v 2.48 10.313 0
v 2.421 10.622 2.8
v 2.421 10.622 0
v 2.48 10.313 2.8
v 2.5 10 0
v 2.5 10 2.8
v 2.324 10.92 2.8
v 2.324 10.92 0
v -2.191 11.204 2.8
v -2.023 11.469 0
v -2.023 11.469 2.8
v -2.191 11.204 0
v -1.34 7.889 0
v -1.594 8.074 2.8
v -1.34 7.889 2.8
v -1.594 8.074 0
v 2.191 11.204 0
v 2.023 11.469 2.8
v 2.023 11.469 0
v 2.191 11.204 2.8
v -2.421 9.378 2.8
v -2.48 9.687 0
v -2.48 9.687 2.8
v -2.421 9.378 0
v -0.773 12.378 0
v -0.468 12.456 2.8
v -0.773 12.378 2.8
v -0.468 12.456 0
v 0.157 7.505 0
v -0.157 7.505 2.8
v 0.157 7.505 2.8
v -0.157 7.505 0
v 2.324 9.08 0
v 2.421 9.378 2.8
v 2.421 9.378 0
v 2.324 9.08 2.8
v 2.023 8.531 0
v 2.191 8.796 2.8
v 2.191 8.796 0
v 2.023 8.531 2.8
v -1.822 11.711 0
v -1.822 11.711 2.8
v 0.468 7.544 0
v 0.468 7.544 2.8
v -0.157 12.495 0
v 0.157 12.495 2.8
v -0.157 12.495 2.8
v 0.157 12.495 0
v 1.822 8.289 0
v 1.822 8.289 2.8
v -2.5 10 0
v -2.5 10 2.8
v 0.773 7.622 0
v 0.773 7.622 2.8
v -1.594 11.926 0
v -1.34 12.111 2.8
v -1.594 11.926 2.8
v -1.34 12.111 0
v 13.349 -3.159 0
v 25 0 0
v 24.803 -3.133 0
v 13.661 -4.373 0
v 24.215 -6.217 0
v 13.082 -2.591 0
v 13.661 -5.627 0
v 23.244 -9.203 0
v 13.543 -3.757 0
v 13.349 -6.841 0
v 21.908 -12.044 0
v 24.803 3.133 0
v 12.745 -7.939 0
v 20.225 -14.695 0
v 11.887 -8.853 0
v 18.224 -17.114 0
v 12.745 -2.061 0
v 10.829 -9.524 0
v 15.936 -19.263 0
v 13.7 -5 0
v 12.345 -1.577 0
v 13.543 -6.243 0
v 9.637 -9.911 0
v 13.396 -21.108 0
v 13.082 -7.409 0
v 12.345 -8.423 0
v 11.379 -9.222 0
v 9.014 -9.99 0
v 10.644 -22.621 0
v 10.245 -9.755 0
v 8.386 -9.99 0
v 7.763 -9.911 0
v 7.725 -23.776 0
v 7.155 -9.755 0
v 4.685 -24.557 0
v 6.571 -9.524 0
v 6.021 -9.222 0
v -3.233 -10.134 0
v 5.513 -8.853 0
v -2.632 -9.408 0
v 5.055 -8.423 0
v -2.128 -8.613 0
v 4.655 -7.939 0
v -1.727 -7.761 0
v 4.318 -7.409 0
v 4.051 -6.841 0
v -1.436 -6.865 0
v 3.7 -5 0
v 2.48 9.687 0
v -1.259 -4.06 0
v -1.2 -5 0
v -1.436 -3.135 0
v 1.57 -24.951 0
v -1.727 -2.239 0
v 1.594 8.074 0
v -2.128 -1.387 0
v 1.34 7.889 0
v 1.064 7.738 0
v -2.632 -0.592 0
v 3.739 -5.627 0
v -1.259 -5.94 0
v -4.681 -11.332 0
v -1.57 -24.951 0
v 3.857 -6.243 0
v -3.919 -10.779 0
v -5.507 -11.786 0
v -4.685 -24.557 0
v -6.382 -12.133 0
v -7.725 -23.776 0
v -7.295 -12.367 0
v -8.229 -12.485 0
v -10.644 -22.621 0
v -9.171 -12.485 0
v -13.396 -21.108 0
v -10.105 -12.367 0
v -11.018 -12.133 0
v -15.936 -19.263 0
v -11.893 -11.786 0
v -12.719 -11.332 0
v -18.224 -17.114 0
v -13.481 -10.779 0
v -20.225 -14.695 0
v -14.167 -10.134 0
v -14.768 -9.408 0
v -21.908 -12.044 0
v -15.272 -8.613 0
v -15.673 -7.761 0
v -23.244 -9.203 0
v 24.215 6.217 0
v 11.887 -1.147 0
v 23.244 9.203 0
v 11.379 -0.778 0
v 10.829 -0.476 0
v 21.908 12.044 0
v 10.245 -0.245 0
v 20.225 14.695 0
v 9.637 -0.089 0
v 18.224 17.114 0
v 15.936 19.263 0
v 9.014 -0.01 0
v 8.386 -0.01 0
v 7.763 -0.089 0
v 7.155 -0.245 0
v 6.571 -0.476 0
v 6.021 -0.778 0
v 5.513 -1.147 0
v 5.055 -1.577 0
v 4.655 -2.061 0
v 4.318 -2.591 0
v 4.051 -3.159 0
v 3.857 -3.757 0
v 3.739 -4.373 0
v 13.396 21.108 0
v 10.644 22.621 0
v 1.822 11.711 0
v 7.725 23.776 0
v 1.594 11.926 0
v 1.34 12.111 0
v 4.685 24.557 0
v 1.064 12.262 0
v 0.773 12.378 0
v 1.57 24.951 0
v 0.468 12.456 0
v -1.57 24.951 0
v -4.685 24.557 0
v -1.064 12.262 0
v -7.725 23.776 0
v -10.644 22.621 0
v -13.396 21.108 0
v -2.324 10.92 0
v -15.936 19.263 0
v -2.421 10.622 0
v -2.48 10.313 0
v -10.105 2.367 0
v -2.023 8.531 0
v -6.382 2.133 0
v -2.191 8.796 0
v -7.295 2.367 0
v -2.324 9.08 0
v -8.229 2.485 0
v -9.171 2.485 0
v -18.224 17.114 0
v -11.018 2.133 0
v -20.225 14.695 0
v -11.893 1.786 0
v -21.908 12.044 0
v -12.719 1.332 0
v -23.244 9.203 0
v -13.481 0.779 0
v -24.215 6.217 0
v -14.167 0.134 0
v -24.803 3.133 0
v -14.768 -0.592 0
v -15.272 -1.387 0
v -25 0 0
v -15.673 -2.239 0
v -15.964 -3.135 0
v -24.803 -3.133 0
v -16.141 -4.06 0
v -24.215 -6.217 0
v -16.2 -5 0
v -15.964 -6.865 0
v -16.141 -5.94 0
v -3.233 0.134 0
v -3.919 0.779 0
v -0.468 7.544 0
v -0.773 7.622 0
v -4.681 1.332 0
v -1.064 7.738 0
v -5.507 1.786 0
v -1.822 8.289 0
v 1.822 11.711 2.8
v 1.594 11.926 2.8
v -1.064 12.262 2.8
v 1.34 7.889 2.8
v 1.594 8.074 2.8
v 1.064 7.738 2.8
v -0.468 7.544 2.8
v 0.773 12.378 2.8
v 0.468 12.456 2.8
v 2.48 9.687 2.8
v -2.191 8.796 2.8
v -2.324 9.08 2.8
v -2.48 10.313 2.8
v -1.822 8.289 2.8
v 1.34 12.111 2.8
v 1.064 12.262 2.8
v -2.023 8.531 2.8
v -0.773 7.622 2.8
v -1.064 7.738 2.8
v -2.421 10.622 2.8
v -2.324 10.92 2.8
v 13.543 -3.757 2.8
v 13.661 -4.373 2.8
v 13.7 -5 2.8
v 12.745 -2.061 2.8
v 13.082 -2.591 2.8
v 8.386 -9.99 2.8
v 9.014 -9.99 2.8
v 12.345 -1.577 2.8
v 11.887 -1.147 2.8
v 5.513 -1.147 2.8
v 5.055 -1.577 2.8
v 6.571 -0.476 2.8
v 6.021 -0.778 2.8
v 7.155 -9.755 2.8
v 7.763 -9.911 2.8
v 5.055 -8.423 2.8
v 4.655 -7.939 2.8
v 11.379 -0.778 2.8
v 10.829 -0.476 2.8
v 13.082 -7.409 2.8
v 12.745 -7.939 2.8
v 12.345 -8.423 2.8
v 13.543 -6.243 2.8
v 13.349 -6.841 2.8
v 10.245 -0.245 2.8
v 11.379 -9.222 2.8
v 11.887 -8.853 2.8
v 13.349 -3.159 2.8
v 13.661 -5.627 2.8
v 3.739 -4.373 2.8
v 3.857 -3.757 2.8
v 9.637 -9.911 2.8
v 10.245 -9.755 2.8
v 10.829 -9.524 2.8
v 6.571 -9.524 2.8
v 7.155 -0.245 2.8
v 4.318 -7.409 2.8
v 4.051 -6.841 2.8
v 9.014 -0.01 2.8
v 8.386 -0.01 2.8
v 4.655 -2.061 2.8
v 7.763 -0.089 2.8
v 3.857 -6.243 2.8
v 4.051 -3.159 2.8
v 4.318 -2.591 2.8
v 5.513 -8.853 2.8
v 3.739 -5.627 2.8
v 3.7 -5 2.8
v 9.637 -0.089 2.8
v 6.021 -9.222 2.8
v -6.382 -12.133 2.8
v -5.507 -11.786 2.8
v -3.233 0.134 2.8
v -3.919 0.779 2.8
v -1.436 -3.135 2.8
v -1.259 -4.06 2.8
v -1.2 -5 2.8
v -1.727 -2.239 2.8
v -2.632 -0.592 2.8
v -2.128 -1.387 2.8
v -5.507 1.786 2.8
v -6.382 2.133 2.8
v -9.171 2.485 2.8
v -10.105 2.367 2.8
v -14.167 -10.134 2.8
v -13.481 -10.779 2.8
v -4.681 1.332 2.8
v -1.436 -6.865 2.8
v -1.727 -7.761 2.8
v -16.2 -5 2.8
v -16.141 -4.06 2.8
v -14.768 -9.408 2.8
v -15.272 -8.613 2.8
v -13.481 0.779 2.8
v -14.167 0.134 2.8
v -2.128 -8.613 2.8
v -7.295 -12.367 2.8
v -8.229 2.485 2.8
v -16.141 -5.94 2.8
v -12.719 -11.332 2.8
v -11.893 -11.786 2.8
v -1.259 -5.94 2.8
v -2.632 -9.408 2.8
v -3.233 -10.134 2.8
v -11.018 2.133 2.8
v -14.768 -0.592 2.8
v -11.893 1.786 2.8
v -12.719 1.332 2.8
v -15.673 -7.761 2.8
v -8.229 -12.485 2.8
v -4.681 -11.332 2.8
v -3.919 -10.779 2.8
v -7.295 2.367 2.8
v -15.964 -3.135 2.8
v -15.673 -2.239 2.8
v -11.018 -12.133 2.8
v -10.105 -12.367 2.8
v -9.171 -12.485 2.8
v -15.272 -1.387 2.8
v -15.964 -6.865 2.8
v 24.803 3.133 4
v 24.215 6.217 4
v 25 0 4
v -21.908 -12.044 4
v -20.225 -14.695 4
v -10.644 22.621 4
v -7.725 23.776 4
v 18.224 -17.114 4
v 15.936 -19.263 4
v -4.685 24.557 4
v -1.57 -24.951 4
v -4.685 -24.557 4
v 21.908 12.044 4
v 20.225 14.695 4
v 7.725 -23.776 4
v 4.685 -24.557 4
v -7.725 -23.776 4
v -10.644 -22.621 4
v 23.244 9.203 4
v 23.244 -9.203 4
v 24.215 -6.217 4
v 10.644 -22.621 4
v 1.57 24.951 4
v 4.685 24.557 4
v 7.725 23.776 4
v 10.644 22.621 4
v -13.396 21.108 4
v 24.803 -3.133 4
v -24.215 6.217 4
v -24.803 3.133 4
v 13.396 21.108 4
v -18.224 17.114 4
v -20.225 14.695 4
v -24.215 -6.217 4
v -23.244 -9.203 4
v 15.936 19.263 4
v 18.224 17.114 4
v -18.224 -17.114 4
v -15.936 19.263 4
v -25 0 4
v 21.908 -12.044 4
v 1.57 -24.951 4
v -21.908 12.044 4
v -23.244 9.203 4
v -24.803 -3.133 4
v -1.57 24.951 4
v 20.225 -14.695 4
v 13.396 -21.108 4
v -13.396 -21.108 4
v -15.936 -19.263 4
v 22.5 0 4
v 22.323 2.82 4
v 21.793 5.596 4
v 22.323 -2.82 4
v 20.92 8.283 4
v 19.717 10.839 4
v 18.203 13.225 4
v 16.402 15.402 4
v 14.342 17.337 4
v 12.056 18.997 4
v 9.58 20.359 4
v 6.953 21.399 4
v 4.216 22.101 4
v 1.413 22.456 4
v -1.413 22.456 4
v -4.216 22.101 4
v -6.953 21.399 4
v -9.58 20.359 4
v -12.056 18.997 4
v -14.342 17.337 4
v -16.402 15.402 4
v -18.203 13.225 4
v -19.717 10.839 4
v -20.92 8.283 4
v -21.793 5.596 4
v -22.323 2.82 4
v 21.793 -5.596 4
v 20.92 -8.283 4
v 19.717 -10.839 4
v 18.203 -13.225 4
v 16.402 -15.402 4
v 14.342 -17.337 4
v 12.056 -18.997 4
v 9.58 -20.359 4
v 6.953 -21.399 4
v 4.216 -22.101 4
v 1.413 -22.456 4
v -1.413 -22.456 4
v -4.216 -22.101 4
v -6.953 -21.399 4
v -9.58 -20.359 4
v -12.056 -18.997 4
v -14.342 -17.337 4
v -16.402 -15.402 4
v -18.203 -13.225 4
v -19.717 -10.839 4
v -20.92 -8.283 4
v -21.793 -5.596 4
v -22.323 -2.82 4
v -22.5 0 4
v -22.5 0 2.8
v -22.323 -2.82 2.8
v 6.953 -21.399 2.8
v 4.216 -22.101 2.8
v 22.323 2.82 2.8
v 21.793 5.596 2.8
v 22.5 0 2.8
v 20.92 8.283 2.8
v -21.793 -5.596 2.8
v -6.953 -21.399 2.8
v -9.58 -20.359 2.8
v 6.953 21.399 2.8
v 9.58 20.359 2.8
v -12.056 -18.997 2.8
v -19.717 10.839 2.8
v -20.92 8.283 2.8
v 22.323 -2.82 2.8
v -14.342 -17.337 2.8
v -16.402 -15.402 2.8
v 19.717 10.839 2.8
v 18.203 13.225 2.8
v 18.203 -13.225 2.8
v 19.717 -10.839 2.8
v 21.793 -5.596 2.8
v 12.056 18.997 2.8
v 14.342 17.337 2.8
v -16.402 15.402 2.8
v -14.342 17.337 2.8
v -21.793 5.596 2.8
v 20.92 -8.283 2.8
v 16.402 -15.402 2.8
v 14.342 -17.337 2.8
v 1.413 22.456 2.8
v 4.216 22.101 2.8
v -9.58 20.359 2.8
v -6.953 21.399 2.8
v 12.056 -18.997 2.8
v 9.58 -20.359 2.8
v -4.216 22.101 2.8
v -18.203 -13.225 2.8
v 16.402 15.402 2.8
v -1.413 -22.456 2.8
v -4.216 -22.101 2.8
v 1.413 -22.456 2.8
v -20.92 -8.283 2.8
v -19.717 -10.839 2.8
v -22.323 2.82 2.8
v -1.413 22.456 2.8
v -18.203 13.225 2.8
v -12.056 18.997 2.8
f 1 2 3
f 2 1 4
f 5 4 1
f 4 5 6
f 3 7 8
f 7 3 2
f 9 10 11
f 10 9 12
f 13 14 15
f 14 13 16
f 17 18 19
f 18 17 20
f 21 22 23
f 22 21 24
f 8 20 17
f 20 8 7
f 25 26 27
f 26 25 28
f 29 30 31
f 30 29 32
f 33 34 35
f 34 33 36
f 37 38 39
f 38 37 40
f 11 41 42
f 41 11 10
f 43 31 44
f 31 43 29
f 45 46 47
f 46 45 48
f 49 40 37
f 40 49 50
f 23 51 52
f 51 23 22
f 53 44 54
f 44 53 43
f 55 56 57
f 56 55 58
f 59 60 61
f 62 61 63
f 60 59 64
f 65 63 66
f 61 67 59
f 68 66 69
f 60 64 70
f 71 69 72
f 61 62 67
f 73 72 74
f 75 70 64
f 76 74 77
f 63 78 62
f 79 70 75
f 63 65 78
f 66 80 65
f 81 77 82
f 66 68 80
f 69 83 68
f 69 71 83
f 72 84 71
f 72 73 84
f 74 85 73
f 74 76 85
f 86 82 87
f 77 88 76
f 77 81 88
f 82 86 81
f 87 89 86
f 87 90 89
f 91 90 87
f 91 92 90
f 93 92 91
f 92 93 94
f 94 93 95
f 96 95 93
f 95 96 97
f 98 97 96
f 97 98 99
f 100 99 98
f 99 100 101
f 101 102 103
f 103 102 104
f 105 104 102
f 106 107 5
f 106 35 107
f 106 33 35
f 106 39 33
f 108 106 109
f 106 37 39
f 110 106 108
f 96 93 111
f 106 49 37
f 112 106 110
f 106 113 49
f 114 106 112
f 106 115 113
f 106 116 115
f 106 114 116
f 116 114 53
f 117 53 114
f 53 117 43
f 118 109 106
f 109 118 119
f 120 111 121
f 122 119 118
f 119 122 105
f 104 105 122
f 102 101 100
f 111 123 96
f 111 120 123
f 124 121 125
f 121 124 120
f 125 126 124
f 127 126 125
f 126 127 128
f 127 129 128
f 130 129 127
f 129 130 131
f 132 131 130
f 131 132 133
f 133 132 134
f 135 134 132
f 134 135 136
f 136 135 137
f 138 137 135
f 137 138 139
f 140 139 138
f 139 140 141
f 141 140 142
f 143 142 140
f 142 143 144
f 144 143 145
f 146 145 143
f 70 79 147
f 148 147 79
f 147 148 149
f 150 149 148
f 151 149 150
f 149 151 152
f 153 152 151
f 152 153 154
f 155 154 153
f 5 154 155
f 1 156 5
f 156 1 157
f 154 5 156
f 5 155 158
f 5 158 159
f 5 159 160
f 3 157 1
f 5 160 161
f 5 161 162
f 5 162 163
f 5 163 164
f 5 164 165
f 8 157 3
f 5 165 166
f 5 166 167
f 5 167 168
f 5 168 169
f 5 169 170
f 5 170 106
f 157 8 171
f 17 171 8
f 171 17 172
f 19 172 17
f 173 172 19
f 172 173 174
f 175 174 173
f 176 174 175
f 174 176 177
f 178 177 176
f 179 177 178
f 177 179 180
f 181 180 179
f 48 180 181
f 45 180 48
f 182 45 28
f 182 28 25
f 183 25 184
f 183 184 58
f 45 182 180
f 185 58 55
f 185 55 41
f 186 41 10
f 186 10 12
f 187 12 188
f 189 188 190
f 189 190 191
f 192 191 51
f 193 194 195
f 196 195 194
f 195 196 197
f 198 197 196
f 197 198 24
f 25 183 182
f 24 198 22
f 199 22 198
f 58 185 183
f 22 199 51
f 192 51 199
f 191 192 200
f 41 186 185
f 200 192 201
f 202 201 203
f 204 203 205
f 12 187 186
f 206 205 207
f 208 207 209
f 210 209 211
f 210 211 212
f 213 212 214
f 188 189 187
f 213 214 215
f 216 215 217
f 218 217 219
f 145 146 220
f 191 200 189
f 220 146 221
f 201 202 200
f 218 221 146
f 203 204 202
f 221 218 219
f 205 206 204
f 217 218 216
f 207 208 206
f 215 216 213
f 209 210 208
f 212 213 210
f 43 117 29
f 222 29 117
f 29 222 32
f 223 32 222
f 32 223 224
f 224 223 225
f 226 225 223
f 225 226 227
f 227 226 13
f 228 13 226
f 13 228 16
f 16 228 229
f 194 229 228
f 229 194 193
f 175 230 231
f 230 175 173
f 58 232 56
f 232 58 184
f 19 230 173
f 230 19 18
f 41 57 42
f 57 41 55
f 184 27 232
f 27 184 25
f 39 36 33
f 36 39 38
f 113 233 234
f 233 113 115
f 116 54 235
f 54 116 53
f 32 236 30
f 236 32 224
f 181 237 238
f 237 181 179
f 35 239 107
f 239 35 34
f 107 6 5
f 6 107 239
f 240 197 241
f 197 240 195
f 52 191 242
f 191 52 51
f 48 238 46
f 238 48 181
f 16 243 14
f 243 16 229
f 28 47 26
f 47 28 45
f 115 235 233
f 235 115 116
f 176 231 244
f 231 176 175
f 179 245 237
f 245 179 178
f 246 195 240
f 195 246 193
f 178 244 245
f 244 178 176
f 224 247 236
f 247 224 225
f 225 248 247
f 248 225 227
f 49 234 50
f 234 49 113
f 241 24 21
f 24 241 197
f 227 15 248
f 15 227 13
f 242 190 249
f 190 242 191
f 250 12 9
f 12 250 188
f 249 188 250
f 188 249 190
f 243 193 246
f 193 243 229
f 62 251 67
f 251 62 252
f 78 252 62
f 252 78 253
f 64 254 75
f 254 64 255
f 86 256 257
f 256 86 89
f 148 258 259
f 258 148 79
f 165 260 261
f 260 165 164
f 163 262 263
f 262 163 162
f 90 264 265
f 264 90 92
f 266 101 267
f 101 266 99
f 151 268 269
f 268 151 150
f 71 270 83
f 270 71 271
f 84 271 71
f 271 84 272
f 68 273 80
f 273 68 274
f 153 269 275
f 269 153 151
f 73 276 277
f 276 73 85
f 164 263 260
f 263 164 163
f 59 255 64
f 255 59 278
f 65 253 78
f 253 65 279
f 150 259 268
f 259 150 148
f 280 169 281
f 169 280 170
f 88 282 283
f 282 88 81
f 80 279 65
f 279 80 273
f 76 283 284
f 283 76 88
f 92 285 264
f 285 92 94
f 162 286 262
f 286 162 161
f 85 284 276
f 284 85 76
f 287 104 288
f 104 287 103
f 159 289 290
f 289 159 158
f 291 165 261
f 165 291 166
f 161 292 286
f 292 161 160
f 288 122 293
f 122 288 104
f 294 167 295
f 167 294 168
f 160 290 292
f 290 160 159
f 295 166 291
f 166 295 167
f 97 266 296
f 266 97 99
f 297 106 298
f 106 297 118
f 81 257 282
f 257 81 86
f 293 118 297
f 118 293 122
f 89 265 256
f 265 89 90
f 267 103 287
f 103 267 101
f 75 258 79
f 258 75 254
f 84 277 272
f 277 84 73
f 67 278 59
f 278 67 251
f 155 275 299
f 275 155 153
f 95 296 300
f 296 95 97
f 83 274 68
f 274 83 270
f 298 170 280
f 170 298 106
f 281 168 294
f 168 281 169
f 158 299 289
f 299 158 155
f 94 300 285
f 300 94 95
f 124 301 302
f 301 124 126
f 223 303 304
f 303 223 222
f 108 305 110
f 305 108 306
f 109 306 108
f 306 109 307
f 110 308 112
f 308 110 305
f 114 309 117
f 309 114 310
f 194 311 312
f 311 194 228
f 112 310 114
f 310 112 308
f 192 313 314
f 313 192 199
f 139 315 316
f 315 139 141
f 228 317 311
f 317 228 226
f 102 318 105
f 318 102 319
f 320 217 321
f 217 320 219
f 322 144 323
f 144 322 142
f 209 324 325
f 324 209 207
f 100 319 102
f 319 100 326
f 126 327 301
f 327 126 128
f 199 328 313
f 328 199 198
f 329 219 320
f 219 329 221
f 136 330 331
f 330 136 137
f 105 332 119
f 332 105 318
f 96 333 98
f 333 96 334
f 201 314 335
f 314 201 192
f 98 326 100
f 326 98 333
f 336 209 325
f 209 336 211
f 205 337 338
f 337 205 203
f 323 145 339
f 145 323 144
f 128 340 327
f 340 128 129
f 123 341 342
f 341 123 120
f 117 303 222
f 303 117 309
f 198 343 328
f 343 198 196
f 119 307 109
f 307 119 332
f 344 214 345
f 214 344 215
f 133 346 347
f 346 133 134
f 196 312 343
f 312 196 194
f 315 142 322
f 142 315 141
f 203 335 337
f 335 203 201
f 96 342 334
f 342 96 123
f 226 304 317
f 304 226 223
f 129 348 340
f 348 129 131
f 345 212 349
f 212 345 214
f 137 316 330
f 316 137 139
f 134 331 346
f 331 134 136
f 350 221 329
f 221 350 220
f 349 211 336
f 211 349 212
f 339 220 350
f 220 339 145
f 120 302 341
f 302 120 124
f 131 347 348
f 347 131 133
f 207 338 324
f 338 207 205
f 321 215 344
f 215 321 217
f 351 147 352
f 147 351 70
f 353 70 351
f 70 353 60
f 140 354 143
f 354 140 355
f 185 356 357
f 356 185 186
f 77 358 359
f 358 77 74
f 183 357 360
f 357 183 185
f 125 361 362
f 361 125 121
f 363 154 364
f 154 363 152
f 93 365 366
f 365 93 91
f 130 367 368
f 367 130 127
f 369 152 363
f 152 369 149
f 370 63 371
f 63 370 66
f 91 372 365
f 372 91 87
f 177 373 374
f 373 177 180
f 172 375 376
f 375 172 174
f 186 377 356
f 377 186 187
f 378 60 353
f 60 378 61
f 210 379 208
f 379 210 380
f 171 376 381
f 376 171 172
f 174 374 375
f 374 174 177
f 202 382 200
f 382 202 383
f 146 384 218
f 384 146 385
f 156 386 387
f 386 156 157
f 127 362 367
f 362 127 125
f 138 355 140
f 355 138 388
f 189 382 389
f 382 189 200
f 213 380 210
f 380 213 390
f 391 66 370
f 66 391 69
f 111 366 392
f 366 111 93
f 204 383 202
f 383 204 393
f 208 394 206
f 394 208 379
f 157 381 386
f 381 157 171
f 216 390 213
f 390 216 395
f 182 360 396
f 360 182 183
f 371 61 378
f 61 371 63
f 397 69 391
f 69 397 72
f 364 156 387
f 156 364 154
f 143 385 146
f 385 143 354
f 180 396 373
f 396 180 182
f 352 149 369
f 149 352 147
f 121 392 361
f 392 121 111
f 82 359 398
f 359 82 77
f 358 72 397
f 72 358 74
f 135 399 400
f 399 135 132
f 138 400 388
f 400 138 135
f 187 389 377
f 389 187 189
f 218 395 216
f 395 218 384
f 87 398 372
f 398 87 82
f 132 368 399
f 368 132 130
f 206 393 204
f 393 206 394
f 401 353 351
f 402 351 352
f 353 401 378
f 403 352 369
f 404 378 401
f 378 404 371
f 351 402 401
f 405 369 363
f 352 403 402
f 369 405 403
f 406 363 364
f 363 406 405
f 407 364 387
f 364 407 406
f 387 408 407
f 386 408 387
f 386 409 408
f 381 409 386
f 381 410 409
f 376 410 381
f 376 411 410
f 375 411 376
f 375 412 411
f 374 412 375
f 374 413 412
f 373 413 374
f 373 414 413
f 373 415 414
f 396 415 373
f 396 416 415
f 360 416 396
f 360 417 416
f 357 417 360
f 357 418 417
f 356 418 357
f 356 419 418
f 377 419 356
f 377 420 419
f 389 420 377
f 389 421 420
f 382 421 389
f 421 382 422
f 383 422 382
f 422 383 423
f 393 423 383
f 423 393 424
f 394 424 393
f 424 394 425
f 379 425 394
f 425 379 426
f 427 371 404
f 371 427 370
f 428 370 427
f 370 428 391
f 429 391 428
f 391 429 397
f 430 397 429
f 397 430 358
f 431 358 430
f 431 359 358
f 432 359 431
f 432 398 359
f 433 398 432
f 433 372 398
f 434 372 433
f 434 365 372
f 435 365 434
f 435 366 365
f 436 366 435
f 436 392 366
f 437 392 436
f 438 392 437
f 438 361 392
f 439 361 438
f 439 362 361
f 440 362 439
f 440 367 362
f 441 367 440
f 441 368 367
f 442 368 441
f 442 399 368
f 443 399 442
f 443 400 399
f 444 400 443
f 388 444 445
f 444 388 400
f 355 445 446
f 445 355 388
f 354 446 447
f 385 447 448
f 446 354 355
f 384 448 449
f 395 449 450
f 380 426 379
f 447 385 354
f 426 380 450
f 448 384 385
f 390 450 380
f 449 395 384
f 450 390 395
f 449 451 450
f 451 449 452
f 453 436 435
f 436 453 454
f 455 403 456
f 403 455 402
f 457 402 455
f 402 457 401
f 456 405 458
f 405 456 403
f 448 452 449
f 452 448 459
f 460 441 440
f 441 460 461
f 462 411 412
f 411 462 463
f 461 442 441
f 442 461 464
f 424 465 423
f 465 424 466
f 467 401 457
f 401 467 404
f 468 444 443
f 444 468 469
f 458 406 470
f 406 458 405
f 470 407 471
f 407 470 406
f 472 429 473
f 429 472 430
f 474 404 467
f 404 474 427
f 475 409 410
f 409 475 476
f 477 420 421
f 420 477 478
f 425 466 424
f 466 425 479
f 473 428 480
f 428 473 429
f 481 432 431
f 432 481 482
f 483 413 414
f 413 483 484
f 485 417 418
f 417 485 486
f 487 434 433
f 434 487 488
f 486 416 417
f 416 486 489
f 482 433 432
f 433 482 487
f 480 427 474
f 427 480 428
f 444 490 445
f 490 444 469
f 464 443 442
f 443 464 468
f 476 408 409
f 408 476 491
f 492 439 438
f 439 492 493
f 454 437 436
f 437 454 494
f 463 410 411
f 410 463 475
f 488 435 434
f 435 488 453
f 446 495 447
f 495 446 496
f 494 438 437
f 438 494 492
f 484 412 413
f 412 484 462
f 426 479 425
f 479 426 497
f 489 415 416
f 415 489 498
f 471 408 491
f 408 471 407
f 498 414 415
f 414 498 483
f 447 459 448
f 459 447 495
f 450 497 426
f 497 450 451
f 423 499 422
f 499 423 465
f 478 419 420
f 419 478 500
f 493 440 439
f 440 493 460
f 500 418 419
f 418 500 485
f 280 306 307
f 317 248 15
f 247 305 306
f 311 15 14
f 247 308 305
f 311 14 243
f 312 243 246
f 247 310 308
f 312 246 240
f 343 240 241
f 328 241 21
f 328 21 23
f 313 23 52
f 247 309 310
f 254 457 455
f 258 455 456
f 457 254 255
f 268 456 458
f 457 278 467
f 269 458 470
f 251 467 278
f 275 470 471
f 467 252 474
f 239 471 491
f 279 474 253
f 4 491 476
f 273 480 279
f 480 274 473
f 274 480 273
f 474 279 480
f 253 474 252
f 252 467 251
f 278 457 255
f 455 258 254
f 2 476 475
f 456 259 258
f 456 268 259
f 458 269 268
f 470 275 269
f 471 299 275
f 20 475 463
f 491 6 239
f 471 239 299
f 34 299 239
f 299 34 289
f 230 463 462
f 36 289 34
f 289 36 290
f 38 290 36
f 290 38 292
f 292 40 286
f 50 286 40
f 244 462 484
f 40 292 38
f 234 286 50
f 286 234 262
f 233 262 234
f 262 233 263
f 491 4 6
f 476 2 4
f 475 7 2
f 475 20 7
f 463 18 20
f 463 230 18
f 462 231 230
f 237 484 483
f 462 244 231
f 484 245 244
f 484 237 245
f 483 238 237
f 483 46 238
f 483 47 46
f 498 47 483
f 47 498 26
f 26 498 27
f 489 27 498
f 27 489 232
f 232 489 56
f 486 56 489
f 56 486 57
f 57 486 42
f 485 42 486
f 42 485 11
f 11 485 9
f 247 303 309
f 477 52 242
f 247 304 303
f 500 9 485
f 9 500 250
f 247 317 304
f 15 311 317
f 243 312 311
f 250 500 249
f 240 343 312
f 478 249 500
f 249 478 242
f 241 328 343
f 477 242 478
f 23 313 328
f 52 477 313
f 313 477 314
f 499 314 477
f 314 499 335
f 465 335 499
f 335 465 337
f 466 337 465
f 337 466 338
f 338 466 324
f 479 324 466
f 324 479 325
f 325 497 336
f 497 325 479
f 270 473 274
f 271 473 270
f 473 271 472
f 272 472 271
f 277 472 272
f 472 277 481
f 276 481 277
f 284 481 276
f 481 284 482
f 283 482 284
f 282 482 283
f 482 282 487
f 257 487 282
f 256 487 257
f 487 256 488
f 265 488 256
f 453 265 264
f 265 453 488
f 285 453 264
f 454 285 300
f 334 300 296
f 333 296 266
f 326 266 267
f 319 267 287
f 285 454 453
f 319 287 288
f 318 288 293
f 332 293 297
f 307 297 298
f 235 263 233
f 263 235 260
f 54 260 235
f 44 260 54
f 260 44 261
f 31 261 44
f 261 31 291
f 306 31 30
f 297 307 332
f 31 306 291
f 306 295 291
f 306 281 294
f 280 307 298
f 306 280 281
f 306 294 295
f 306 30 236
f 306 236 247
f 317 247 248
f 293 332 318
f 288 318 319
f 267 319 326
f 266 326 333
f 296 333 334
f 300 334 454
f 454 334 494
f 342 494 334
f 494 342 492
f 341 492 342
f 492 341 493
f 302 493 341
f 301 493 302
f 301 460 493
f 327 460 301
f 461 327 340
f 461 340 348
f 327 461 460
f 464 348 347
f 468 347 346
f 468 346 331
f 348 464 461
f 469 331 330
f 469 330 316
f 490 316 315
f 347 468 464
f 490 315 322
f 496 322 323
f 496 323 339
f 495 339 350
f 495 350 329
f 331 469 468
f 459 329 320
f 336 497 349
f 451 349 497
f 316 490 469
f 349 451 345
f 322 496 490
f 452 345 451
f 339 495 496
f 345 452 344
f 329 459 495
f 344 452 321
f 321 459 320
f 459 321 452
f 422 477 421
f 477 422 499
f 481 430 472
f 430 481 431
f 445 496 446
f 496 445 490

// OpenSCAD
$fn = 50*1;

diameter = 50; //[25:75]
height = 4; //[4:7]
number_of_holes = 3; //[1:5]
hole_diameter_start = 5; //[5:20]
hole_diameter_end = 15; //[15:40]
hole_offset = 10; //[0:50]
lip_ratio = 70; //[0:100]
edge_ratio = 90; //[0:100]

main();

module main(){
	difference(){
		cylinder(h = height, r = diameter/2); 
		if (number_of_holes == 1) {
			oneHole();
		} else if (number_of_holes == 2) {
			twoHoles();
		} else if (number_of_holes == 3) {
			threeHoles();
		} else if (number_of_holes == 4){
			fourHoles();
		} else {
			fiveHoles();
		}
		translate(v=[0,0,height*lip_ratio*.01])
		cylinder(h = 25, r = diameter/2*edge_ratio*.01);
	}
}

module oneHole() {
	cylinder(h=25, r = hole_diameter_start/2);
}

module twoHoles() {
	translate(v=[hole_offset, 0, 0])
	cylinder(h = 25, r = hole_diameter_start/2);
	translate(v=[-hole_offset, 0, 0])
	cylinder(h = 25, r = hole_diameter_end/2);	
}

module threeHoles() {
	translate(v=[0, hole_offset, 0])
	cylinder(h = 25, r = hole_diameter_start/2);
	translate(v=[.87*hole_offset, -.5*hole_offset, 0])
	cylinder(h = 25, r = ( hole_diameter_end - hole_diameter_start )/2);
	translate(v=[-.87*hole_offset, -.5*hole_offset, 0])
	cylinder(h = 25, r = hole_diameter_end/2);	
}

module fourHoles() {
	translate(v=[hole_offset, hole_offset, 0])
	cylinder(h = 25, r = hole_diameter_start/2);
	translate(v=[-hole_offset, hole_offset, 0])
	cylinder(h = 25, r = ( hole_diameter_end - hole_diameter_start )/6 + hole_diameter_start/2);	
	translate(v=[hole_offset, -hole_offset, 0])
	cylinder(h = 25, r = ( hole_diameter_end - hole_diameter_start )/3 + hole_diameter_start/2);	
	translate(v=[-hole_offset,-hole_offset,0])
	cylinder(h = 25, r = hole_diameter_end/2);
}

module fiveHoles() {
	translate(v=[0, hole_offset, 0])
	cylinder(h = 25, r = hole_diameter/2);
	translate(v=[hole_offset*.95, hole_offset*.31, 0])
	cylinder(h = 25, r =     ( hole_diameter_end - hole_diameter_start )/8 + hole_diameter_start/2);	
	translate(v=[hole_offset*.59, -hole_offset*.81, 0])
	cylinder(h = 25, r =     ( hole_diameter_end - hole_diameter_start )/4 + hole_diameter_start/2);	
	translate(v=[-hole_offset*.59,-hole_offset*.81,0])
	cylinder(h = 25, r = 3 * ( hole_diameter_end - hole_diameter_start )/8 + hole_diameter_start/2);	
	translate(v=[-hole_offset*.95,hole_offset*.31,0])
	cylinder(h = 25, r = hole_diameter/2);
}
